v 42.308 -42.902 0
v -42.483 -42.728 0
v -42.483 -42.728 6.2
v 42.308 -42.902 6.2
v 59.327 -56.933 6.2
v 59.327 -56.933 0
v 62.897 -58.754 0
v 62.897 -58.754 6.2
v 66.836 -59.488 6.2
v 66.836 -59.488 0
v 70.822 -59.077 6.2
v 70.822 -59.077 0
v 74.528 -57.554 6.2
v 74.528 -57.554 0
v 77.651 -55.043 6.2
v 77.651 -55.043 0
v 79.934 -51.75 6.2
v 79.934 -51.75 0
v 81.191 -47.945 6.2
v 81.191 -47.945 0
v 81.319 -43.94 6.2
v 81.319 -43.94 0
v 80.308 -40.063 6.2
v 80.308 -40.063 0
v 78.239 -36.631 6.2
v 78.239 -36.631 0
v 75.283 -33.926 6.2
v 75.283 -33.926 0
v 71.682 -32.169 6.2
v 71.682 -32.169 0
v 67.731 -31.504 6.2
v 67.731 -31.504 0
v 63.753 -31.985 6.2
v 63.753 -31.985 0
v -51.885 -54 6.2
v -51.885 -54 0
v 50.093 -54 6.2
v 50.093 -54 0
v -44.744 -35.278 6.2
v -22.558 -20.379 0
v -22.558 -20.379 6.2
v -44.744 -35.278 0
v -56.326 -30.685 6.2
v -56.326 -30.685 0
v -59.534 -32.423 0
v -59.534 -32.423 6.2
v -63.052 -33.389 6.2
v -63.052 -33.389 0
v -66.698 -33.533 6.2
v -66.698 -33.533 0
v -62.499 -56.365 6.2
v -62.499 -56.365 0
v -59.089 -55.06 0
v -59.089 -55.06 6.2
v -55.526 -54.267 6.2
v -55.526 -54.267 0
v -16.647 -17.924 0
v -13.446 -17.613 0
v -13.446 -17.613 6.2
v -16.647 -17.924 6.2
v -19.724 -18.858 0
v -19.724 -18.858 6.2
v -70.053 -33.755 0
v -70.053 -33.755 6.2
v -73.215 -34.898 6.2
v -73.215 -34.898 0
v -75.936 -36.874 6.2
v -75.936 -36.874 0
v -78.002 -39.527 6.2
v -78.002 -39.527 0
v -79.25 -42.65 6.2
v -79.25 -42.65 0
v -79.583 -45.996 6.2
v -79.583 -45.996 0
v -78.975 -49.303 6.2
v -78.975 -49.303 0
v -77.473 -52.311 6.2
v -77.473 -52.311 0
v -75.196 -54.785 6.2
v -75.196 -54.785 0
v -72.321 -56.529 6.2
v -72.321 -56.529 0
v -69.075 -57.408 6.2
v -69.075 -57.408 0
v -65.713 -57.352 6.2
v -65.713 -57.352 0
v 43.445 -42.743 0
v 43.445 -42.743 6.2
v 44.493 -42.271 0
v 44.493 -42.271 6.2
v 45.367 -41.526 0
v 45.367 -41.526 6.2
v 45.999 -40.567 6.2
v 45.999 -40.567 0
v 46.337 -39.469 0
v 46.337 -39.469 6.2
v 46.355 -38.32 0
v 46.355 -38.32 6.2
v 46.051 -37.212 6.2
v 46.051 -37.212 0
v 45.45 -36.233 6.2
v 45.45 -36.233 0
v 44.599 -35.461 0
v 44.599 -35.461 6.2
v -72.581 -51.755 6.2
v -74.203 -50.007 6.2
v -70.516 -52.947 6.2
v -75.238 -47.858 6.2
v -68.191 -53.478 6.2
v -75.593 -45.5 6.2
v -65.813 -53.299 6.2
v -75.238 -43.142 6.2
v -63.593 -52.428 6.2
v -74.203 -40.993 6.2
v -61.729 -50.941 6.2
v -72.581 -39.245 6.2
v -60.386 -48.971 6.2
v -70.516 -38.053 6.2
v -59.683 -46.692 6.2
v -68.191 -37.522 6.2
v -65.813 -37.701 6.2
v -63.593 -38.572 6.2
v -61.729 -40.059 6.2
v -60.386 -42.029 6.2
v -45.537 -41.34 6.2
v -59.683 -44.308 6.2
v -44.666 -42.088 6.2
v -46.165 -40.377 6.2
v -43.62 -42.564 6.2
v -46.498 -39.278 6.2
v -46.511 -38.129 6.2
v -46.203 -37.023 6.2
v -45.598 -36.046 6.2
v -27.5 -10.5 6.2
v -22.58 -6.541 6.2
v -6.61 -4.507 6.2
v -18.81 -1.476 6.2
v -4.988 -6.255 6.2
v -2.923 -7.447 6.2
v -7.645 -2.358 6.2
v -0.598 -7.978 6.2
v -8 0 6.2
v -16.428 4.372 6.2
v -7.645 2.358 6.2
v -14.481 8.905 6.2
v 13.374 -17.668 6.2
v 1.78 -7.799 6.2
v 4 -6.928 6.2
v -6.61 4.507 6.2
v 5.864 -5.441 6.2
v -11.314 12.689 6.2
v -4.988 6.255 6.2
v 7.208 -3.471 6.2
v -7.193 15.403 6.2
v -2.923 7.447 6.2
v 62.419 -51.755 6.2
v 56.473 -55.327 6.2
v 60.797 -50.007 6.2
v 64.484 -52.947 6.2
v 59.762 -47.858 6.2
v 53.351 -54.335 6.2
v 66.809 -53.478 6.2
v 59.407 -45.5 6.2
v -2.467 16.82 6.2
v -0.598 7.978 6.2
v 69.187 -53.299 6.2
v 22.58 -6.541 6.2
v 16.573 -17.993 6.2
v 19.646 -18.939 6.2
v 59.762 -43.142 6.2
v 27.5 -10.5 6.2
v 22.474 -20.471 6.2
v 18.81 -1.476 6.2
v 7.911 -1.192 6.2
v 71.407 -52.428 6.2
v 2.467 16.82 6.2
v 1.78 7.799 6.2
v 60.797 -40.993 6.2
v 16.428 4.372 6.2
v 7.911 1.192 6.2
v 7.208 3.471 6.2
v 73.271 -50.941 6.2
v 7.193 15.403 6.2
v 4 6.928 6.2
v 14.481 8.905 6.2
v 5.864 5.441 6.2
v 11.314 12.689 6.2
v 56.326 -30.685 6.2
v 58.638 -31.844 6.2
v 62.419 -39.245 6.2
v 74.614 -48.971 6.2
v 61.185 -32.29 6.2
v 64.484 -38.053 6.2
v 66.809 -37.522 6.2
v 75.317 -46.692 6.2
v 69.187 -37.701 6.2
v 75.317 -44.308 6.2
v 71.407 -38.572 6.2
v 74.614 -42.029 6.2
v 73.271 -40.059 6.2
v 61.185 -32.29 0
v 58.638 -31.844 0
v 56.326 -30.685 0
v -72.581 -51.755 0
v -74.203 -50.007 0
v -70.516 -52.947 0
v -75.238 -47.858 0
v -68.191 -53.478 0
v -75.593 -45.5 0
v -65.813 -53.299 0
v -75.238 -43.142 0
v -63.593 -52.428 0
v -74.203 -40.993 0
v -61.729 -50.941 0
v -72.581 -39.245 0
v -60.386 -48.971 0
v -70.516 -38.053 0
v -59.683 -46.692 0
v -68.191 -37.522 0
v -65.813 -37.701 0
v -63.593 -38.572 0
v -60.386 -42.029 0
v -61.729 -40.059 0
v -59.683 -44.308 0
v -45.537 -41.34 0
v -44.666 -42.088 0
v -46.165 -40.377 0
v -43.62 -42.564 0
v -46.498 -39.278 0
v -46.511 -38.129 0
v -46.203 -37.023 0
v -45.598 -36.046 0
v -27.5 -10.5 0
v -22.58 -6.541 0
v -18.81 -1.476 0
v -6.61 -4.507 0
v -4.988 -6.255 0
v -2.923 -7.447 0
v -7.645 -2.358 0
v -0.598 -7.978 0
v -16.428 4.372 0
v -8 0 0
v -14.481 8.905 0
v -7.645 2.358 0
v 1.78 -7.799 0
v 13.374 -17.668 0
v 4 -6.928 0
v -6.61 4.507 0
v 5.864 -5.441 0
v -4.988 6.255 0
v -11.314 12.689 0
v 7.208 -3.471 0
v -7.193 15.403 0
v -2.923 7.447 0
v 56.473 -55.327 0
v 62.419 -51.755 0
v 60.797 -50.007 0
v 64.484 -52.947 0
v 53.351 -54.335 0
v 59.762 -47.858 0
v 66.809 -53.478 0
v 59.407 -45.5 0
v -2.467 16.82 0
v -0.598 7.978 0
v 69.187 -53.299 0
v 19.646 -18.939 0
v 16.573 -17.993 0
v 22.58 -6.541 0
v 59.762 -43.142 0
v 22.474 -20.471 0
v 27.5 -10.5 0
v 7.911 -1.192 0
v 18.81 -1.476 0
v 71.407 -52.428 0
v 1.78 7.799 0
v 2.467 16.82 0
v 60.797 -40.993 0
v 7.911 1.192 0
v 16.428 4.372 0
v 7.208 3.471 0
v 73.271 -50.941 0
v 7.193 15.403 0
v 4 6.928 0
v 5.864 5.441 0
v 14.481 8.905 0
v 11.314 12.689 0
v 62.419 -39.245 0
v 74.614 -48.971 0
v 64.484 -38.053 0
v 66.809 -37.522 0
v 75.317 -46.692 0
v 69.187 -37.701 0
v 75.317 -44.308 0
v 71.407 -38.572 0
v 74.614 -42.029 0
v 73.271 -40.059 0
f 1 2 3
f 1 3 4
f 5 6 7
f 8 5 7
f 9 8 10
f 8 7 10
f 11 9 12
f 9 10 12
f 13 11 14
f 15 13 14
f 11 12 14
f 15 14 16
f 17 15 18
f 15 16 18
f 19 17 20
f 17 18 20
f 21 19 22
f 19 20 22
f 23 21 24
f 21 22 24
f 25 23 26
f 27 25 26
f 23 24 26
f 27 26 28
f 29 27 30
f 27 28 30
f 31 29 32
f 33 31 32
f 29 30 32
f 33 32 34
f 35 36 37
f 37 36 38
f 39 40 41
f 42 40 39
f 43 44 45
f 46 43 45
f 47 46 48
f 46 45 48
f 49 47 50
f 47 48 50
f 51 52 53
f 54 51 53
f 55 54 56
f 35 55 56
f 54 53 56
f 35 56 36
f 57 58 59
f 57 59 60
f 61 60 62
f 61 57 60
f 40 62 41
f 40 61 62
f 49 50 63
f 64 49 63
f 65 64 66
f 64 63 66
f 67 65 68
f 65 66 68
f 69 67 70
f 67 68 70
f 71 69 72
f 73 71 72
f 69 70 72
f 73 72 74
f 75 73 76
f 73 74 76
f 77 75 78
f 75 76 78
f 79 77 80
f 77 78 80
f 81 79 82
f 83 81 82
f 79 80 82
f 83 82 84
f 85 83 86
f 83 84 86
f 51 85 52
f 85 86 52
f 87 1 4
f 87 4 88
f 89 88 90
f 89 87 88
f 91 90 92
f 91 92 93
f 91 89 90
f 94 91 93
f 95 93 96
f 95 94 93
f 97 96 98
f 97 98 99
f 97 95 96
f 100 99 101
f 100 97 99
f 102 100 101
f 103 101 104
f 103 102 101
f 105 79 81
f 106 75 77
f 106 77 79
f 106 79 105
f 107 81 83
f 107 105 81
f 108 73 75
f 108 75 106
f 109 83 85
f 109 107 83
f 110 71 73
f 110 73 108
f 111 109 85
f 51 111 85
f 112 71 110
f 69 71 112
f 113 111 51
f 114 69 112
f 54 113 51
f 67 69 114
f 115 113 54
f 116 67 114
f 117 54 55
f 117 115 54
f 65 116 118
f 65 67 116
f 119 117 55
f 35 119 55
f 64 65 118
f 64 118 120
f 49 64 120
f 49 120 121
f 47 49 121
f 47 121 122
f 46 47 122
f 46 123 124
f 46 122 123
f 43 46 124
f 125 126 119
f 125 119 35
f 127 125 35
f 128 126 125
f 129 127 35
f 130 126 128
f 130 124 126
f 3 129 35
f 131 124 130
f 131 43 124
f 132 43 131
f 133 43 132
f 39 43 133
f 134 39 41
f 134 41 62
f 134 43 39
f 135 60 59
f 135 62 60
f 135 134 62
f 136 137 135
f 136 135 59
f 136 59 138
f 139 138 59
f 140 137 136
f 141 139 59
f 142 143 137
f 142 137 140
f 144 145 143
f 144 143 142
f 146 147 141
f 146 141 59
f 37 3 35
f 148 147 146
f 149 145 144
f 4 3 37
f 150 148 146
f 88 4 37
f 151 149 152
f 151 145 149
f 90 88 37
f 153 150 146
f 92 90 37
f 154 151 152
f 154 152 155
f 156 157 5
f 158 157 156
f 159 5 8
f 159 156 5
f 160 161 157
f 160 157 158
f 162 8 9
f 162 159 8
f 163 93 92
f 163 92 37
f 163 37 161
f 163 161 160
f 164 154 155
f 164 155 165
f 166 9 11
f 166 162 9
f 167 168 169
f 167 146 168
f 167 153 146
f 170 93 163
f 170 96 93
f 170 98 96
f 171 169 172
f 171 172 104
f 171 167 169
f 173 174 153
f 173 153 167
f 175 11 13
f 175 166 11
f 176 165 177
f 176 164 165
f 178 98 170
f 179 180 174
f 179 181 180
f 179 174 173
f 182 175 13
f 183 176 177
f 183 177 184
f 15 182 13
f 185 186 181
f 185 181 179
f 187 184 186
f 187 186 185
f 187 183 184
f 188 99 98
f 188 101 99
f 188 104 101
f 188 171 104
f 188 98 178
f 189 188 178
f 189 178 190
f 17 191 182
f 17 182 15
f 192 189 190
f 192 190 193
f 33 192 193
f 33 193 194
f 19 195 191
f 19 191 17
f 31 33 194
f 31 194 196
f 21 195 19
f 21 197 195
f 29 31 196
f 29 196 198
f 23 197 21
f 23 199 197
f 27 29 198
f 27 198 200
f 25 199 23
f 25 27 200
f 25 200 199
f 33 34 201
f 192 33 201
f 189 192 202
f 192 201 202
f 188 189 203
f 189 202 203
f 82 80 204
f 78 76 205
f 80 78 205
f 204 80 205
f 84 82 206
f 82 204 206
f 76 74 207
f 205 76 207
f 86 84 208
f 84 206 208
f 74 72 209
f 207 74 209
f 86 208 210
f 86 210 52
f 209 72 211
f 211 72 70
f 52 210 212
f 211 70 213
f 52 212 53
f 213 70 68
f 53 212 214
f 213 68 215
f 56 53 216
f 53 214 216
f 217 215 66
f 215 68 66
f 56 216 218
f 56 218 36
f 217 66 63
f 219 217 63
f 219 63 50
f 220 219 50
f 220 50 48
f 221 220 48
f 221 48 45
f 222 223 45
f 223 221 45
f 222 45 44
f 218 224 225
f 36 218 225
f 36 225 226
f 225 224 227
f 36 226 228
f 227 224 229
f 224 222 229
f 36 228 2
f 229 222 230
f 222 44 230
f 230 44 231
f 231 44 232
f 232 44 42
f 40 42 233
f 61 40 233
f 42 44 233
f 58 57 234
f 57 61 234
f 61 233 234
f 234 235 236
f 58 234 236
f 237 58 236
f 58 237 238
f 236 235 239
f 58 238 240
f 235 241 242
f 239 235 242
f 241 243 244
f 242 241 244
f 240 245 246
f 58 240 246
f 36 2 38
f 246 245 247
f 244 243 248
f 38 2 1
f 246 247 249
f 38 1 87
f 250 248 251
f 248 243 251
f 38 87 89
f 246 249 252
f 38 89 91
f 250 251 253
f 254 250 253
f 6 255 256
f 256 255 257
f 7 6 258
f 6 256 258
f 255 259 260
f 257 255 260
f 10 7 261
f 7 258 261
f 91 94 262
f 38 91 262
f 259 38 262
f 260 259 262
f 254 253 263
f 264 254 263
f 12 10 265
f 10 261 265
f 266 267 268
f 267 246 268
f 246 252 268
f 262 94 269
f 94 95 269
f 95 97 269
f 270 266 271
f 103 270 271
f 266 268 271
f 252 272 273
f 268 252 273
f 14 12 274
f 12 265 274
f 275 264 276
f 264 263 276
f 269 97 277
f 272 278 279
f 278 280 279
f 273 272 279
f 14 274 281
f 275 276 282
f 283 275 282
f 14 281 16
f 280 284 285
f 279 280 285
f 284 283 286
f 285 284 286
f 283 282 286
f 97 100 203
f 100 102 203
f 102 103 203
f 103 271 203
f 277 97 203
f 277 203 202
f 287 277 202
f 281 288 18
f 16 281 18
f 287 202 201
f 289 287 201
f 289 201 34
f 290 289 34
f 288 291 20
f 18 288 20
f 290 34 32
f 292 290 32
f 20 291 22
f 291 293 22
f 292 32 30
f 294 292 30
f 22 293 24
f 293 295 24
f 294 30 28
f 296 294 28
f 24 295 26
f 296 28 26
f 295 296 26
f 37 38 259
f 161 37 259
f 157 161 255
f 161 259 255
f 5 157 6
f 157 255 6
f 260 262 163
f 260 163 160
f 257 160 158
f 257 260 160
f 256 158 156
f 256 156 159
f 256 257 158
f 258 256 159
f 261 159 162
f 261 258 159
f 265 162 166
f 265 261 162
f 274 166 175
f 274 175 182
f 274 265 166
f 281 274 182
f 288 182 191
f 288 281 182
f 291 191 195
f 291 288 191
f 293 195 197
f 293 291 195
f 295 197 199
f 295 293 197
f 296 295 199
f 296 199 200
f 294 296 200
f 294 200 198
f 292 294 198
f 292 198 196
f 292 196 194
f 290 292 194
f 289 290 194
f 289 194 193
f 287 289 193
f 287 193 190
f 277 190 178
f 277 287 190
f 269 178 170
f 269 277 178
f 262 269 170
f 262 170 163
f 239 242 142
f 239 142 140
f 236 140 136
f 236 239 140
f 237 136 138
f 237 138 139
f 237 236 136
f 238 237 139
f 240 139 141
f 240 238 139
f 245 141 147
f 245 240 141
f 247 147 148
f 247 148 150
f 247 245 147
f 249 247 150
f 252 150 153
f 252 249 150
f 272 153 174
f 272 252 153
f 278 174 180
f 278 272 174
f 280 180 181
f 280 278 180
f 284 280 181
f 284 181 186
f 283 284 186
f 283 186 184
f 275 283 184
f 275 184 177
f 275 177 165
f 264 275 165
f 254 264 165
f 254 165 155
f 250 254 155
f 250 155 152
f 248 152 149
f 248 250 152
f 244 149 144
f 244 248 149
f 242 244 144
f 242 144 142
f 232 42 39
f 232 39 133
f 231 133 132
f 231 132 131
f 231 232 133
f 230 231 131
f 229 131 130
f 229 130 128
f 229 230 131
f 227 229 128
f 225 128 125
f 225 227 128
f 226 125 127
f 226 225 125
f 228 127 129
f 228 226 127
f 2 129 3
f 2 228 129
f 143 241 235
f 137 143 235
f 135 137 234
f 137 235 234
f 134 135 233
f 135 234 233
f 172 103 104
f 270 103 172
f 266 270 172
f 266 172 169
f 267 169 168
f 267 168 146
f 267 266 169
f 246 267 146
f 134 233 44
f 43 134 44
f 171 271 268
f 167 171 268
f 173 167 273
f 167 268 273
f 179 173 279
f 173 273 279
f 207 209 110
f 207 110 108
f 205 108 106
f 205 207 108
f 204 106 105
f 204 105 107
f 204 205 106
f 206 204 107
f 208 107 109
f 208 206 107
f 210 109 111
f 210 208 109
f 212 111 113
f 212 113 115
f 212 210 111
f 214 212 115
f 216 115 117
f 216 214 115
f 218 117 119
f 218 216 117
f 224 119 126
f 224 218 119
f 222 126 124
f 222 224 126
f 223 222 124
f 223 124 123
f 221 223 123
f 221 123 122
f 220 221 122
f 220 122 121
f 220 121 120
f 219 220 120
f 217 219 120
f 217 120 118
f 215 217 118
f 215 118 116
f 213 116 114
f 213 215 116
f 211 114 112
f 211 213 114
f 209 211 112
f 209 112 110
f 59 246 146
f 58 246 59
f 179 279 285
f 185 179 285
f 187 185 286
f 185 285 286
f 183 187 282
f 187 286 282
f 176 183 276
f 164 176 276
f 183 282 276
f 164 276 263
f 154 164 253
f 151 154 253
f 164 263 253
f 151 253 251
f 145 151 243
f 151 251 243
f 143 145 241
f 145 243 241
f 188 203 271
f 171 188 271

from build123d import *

# Parameters (mm, degrees)
SKETCH1_R           = 8
BOSS_EXTRUDE5_DEPTH = 6.2


with BuildPart() as part:
    # Sketch1 → Boss-Extrude5 (new body)
    with BuildSketch(Plane.XY):
        with BuildLine():
            Line((56.326485312, -30.684522316), (27.5, -10.5))
            ThreePointArc((27.5, -10.5), (20.534538743, -4.128471677), (16.428279646, 4.371684787))
            ThreePointArc((16.428279646, 4.371684787), (0, 17), (-16.428279646, 4.371684787))
            ThreePointArc((-16.428279646, 4.371684787), (-20.534538743, -4.128471677), (-27.5, -10.5))
            Line((-27.5, -10.5), (-56.326485312, -30.684522316))
            ThreePointArc((-56.326485312, -30.684522316), (-61.265597018, -33.006583144), (-66.697832686, -33.533466974))
            ThreePointArc((-66.697832686, -33.533466974), (-79.395490057, -47.670549132), (-62.498849309, -56.364864865))
            ThreePointArc((-62.498849309, -56.364864865), (-57.322133361, -54.598377325), (-51.885147908, -54))
            Line((-51.885147908, -54), (50.093284326, -54))
            ThreePointArc((50.093284326, -54), (54.937524893, -54.750956314), (59.327038829, -56.933333333))
            ThreePointArc((59.327038829, -56.933333333), (81.19137471, -47.945254568), (63.752518972, -31.985271674))
            ThreePointArc((63.752518972, -31.985271674), (59.894931525, -32.160256826), (56.326485312, -30.684522316))
        make_face()
        with Locations(Location((67.406574019, -45.5, 0), (0, 0, 180))):
            Circle(SKETCH1_R, mode=Mode.SUBTRACT)
        with Locations(Location((0, 0, 0), (0, 0, 180))):
            Circle(SKETCH1_R, mode=Mode.SUBTRACT)
        with Locations(Location((-67.593425981, -45.5, 0), (0, 0, 180))):
            Circle(SKETCH1_R, mode=Mode.SUBTRACT)
        with BuildLine():
            Line((13.373633763, -17.668465774), (-13.446021539, -17.613430543))
            ThreePointArc((-13.446021539, -17.613430543), (-18.208444632, -18.31519172), (-22.557597192, -20.378687414))
            Line((-22.557597192, -20.378687414), (-44.744358674, -35.277702309))
            ThreePointArc((-44.744358674, -35.277702309), (-46.370360965, -39.839621324), (-42.483173297, -42.728351249))
            Line((-42.483173297, -42.728351249), (42.307503535, -42.902337904))
            ThreePointArc((42.307503535, -42.902337904), (46.206513764, -40.029584072), (44.599245091, -35.46103039))
            Line((44.599245091, -35.46103039), (22.473807978, -20.471098353))
            ThreePointArc((22.473807978, -20.471098353), (18.133148836, -18.389767499), (13.373633763, -17.668465774))
        make_face(mode=Mode.SUBTRACT)
    extrude(amount=BOSS_EXTRUDE5_DEPTH)


solid = part.part
